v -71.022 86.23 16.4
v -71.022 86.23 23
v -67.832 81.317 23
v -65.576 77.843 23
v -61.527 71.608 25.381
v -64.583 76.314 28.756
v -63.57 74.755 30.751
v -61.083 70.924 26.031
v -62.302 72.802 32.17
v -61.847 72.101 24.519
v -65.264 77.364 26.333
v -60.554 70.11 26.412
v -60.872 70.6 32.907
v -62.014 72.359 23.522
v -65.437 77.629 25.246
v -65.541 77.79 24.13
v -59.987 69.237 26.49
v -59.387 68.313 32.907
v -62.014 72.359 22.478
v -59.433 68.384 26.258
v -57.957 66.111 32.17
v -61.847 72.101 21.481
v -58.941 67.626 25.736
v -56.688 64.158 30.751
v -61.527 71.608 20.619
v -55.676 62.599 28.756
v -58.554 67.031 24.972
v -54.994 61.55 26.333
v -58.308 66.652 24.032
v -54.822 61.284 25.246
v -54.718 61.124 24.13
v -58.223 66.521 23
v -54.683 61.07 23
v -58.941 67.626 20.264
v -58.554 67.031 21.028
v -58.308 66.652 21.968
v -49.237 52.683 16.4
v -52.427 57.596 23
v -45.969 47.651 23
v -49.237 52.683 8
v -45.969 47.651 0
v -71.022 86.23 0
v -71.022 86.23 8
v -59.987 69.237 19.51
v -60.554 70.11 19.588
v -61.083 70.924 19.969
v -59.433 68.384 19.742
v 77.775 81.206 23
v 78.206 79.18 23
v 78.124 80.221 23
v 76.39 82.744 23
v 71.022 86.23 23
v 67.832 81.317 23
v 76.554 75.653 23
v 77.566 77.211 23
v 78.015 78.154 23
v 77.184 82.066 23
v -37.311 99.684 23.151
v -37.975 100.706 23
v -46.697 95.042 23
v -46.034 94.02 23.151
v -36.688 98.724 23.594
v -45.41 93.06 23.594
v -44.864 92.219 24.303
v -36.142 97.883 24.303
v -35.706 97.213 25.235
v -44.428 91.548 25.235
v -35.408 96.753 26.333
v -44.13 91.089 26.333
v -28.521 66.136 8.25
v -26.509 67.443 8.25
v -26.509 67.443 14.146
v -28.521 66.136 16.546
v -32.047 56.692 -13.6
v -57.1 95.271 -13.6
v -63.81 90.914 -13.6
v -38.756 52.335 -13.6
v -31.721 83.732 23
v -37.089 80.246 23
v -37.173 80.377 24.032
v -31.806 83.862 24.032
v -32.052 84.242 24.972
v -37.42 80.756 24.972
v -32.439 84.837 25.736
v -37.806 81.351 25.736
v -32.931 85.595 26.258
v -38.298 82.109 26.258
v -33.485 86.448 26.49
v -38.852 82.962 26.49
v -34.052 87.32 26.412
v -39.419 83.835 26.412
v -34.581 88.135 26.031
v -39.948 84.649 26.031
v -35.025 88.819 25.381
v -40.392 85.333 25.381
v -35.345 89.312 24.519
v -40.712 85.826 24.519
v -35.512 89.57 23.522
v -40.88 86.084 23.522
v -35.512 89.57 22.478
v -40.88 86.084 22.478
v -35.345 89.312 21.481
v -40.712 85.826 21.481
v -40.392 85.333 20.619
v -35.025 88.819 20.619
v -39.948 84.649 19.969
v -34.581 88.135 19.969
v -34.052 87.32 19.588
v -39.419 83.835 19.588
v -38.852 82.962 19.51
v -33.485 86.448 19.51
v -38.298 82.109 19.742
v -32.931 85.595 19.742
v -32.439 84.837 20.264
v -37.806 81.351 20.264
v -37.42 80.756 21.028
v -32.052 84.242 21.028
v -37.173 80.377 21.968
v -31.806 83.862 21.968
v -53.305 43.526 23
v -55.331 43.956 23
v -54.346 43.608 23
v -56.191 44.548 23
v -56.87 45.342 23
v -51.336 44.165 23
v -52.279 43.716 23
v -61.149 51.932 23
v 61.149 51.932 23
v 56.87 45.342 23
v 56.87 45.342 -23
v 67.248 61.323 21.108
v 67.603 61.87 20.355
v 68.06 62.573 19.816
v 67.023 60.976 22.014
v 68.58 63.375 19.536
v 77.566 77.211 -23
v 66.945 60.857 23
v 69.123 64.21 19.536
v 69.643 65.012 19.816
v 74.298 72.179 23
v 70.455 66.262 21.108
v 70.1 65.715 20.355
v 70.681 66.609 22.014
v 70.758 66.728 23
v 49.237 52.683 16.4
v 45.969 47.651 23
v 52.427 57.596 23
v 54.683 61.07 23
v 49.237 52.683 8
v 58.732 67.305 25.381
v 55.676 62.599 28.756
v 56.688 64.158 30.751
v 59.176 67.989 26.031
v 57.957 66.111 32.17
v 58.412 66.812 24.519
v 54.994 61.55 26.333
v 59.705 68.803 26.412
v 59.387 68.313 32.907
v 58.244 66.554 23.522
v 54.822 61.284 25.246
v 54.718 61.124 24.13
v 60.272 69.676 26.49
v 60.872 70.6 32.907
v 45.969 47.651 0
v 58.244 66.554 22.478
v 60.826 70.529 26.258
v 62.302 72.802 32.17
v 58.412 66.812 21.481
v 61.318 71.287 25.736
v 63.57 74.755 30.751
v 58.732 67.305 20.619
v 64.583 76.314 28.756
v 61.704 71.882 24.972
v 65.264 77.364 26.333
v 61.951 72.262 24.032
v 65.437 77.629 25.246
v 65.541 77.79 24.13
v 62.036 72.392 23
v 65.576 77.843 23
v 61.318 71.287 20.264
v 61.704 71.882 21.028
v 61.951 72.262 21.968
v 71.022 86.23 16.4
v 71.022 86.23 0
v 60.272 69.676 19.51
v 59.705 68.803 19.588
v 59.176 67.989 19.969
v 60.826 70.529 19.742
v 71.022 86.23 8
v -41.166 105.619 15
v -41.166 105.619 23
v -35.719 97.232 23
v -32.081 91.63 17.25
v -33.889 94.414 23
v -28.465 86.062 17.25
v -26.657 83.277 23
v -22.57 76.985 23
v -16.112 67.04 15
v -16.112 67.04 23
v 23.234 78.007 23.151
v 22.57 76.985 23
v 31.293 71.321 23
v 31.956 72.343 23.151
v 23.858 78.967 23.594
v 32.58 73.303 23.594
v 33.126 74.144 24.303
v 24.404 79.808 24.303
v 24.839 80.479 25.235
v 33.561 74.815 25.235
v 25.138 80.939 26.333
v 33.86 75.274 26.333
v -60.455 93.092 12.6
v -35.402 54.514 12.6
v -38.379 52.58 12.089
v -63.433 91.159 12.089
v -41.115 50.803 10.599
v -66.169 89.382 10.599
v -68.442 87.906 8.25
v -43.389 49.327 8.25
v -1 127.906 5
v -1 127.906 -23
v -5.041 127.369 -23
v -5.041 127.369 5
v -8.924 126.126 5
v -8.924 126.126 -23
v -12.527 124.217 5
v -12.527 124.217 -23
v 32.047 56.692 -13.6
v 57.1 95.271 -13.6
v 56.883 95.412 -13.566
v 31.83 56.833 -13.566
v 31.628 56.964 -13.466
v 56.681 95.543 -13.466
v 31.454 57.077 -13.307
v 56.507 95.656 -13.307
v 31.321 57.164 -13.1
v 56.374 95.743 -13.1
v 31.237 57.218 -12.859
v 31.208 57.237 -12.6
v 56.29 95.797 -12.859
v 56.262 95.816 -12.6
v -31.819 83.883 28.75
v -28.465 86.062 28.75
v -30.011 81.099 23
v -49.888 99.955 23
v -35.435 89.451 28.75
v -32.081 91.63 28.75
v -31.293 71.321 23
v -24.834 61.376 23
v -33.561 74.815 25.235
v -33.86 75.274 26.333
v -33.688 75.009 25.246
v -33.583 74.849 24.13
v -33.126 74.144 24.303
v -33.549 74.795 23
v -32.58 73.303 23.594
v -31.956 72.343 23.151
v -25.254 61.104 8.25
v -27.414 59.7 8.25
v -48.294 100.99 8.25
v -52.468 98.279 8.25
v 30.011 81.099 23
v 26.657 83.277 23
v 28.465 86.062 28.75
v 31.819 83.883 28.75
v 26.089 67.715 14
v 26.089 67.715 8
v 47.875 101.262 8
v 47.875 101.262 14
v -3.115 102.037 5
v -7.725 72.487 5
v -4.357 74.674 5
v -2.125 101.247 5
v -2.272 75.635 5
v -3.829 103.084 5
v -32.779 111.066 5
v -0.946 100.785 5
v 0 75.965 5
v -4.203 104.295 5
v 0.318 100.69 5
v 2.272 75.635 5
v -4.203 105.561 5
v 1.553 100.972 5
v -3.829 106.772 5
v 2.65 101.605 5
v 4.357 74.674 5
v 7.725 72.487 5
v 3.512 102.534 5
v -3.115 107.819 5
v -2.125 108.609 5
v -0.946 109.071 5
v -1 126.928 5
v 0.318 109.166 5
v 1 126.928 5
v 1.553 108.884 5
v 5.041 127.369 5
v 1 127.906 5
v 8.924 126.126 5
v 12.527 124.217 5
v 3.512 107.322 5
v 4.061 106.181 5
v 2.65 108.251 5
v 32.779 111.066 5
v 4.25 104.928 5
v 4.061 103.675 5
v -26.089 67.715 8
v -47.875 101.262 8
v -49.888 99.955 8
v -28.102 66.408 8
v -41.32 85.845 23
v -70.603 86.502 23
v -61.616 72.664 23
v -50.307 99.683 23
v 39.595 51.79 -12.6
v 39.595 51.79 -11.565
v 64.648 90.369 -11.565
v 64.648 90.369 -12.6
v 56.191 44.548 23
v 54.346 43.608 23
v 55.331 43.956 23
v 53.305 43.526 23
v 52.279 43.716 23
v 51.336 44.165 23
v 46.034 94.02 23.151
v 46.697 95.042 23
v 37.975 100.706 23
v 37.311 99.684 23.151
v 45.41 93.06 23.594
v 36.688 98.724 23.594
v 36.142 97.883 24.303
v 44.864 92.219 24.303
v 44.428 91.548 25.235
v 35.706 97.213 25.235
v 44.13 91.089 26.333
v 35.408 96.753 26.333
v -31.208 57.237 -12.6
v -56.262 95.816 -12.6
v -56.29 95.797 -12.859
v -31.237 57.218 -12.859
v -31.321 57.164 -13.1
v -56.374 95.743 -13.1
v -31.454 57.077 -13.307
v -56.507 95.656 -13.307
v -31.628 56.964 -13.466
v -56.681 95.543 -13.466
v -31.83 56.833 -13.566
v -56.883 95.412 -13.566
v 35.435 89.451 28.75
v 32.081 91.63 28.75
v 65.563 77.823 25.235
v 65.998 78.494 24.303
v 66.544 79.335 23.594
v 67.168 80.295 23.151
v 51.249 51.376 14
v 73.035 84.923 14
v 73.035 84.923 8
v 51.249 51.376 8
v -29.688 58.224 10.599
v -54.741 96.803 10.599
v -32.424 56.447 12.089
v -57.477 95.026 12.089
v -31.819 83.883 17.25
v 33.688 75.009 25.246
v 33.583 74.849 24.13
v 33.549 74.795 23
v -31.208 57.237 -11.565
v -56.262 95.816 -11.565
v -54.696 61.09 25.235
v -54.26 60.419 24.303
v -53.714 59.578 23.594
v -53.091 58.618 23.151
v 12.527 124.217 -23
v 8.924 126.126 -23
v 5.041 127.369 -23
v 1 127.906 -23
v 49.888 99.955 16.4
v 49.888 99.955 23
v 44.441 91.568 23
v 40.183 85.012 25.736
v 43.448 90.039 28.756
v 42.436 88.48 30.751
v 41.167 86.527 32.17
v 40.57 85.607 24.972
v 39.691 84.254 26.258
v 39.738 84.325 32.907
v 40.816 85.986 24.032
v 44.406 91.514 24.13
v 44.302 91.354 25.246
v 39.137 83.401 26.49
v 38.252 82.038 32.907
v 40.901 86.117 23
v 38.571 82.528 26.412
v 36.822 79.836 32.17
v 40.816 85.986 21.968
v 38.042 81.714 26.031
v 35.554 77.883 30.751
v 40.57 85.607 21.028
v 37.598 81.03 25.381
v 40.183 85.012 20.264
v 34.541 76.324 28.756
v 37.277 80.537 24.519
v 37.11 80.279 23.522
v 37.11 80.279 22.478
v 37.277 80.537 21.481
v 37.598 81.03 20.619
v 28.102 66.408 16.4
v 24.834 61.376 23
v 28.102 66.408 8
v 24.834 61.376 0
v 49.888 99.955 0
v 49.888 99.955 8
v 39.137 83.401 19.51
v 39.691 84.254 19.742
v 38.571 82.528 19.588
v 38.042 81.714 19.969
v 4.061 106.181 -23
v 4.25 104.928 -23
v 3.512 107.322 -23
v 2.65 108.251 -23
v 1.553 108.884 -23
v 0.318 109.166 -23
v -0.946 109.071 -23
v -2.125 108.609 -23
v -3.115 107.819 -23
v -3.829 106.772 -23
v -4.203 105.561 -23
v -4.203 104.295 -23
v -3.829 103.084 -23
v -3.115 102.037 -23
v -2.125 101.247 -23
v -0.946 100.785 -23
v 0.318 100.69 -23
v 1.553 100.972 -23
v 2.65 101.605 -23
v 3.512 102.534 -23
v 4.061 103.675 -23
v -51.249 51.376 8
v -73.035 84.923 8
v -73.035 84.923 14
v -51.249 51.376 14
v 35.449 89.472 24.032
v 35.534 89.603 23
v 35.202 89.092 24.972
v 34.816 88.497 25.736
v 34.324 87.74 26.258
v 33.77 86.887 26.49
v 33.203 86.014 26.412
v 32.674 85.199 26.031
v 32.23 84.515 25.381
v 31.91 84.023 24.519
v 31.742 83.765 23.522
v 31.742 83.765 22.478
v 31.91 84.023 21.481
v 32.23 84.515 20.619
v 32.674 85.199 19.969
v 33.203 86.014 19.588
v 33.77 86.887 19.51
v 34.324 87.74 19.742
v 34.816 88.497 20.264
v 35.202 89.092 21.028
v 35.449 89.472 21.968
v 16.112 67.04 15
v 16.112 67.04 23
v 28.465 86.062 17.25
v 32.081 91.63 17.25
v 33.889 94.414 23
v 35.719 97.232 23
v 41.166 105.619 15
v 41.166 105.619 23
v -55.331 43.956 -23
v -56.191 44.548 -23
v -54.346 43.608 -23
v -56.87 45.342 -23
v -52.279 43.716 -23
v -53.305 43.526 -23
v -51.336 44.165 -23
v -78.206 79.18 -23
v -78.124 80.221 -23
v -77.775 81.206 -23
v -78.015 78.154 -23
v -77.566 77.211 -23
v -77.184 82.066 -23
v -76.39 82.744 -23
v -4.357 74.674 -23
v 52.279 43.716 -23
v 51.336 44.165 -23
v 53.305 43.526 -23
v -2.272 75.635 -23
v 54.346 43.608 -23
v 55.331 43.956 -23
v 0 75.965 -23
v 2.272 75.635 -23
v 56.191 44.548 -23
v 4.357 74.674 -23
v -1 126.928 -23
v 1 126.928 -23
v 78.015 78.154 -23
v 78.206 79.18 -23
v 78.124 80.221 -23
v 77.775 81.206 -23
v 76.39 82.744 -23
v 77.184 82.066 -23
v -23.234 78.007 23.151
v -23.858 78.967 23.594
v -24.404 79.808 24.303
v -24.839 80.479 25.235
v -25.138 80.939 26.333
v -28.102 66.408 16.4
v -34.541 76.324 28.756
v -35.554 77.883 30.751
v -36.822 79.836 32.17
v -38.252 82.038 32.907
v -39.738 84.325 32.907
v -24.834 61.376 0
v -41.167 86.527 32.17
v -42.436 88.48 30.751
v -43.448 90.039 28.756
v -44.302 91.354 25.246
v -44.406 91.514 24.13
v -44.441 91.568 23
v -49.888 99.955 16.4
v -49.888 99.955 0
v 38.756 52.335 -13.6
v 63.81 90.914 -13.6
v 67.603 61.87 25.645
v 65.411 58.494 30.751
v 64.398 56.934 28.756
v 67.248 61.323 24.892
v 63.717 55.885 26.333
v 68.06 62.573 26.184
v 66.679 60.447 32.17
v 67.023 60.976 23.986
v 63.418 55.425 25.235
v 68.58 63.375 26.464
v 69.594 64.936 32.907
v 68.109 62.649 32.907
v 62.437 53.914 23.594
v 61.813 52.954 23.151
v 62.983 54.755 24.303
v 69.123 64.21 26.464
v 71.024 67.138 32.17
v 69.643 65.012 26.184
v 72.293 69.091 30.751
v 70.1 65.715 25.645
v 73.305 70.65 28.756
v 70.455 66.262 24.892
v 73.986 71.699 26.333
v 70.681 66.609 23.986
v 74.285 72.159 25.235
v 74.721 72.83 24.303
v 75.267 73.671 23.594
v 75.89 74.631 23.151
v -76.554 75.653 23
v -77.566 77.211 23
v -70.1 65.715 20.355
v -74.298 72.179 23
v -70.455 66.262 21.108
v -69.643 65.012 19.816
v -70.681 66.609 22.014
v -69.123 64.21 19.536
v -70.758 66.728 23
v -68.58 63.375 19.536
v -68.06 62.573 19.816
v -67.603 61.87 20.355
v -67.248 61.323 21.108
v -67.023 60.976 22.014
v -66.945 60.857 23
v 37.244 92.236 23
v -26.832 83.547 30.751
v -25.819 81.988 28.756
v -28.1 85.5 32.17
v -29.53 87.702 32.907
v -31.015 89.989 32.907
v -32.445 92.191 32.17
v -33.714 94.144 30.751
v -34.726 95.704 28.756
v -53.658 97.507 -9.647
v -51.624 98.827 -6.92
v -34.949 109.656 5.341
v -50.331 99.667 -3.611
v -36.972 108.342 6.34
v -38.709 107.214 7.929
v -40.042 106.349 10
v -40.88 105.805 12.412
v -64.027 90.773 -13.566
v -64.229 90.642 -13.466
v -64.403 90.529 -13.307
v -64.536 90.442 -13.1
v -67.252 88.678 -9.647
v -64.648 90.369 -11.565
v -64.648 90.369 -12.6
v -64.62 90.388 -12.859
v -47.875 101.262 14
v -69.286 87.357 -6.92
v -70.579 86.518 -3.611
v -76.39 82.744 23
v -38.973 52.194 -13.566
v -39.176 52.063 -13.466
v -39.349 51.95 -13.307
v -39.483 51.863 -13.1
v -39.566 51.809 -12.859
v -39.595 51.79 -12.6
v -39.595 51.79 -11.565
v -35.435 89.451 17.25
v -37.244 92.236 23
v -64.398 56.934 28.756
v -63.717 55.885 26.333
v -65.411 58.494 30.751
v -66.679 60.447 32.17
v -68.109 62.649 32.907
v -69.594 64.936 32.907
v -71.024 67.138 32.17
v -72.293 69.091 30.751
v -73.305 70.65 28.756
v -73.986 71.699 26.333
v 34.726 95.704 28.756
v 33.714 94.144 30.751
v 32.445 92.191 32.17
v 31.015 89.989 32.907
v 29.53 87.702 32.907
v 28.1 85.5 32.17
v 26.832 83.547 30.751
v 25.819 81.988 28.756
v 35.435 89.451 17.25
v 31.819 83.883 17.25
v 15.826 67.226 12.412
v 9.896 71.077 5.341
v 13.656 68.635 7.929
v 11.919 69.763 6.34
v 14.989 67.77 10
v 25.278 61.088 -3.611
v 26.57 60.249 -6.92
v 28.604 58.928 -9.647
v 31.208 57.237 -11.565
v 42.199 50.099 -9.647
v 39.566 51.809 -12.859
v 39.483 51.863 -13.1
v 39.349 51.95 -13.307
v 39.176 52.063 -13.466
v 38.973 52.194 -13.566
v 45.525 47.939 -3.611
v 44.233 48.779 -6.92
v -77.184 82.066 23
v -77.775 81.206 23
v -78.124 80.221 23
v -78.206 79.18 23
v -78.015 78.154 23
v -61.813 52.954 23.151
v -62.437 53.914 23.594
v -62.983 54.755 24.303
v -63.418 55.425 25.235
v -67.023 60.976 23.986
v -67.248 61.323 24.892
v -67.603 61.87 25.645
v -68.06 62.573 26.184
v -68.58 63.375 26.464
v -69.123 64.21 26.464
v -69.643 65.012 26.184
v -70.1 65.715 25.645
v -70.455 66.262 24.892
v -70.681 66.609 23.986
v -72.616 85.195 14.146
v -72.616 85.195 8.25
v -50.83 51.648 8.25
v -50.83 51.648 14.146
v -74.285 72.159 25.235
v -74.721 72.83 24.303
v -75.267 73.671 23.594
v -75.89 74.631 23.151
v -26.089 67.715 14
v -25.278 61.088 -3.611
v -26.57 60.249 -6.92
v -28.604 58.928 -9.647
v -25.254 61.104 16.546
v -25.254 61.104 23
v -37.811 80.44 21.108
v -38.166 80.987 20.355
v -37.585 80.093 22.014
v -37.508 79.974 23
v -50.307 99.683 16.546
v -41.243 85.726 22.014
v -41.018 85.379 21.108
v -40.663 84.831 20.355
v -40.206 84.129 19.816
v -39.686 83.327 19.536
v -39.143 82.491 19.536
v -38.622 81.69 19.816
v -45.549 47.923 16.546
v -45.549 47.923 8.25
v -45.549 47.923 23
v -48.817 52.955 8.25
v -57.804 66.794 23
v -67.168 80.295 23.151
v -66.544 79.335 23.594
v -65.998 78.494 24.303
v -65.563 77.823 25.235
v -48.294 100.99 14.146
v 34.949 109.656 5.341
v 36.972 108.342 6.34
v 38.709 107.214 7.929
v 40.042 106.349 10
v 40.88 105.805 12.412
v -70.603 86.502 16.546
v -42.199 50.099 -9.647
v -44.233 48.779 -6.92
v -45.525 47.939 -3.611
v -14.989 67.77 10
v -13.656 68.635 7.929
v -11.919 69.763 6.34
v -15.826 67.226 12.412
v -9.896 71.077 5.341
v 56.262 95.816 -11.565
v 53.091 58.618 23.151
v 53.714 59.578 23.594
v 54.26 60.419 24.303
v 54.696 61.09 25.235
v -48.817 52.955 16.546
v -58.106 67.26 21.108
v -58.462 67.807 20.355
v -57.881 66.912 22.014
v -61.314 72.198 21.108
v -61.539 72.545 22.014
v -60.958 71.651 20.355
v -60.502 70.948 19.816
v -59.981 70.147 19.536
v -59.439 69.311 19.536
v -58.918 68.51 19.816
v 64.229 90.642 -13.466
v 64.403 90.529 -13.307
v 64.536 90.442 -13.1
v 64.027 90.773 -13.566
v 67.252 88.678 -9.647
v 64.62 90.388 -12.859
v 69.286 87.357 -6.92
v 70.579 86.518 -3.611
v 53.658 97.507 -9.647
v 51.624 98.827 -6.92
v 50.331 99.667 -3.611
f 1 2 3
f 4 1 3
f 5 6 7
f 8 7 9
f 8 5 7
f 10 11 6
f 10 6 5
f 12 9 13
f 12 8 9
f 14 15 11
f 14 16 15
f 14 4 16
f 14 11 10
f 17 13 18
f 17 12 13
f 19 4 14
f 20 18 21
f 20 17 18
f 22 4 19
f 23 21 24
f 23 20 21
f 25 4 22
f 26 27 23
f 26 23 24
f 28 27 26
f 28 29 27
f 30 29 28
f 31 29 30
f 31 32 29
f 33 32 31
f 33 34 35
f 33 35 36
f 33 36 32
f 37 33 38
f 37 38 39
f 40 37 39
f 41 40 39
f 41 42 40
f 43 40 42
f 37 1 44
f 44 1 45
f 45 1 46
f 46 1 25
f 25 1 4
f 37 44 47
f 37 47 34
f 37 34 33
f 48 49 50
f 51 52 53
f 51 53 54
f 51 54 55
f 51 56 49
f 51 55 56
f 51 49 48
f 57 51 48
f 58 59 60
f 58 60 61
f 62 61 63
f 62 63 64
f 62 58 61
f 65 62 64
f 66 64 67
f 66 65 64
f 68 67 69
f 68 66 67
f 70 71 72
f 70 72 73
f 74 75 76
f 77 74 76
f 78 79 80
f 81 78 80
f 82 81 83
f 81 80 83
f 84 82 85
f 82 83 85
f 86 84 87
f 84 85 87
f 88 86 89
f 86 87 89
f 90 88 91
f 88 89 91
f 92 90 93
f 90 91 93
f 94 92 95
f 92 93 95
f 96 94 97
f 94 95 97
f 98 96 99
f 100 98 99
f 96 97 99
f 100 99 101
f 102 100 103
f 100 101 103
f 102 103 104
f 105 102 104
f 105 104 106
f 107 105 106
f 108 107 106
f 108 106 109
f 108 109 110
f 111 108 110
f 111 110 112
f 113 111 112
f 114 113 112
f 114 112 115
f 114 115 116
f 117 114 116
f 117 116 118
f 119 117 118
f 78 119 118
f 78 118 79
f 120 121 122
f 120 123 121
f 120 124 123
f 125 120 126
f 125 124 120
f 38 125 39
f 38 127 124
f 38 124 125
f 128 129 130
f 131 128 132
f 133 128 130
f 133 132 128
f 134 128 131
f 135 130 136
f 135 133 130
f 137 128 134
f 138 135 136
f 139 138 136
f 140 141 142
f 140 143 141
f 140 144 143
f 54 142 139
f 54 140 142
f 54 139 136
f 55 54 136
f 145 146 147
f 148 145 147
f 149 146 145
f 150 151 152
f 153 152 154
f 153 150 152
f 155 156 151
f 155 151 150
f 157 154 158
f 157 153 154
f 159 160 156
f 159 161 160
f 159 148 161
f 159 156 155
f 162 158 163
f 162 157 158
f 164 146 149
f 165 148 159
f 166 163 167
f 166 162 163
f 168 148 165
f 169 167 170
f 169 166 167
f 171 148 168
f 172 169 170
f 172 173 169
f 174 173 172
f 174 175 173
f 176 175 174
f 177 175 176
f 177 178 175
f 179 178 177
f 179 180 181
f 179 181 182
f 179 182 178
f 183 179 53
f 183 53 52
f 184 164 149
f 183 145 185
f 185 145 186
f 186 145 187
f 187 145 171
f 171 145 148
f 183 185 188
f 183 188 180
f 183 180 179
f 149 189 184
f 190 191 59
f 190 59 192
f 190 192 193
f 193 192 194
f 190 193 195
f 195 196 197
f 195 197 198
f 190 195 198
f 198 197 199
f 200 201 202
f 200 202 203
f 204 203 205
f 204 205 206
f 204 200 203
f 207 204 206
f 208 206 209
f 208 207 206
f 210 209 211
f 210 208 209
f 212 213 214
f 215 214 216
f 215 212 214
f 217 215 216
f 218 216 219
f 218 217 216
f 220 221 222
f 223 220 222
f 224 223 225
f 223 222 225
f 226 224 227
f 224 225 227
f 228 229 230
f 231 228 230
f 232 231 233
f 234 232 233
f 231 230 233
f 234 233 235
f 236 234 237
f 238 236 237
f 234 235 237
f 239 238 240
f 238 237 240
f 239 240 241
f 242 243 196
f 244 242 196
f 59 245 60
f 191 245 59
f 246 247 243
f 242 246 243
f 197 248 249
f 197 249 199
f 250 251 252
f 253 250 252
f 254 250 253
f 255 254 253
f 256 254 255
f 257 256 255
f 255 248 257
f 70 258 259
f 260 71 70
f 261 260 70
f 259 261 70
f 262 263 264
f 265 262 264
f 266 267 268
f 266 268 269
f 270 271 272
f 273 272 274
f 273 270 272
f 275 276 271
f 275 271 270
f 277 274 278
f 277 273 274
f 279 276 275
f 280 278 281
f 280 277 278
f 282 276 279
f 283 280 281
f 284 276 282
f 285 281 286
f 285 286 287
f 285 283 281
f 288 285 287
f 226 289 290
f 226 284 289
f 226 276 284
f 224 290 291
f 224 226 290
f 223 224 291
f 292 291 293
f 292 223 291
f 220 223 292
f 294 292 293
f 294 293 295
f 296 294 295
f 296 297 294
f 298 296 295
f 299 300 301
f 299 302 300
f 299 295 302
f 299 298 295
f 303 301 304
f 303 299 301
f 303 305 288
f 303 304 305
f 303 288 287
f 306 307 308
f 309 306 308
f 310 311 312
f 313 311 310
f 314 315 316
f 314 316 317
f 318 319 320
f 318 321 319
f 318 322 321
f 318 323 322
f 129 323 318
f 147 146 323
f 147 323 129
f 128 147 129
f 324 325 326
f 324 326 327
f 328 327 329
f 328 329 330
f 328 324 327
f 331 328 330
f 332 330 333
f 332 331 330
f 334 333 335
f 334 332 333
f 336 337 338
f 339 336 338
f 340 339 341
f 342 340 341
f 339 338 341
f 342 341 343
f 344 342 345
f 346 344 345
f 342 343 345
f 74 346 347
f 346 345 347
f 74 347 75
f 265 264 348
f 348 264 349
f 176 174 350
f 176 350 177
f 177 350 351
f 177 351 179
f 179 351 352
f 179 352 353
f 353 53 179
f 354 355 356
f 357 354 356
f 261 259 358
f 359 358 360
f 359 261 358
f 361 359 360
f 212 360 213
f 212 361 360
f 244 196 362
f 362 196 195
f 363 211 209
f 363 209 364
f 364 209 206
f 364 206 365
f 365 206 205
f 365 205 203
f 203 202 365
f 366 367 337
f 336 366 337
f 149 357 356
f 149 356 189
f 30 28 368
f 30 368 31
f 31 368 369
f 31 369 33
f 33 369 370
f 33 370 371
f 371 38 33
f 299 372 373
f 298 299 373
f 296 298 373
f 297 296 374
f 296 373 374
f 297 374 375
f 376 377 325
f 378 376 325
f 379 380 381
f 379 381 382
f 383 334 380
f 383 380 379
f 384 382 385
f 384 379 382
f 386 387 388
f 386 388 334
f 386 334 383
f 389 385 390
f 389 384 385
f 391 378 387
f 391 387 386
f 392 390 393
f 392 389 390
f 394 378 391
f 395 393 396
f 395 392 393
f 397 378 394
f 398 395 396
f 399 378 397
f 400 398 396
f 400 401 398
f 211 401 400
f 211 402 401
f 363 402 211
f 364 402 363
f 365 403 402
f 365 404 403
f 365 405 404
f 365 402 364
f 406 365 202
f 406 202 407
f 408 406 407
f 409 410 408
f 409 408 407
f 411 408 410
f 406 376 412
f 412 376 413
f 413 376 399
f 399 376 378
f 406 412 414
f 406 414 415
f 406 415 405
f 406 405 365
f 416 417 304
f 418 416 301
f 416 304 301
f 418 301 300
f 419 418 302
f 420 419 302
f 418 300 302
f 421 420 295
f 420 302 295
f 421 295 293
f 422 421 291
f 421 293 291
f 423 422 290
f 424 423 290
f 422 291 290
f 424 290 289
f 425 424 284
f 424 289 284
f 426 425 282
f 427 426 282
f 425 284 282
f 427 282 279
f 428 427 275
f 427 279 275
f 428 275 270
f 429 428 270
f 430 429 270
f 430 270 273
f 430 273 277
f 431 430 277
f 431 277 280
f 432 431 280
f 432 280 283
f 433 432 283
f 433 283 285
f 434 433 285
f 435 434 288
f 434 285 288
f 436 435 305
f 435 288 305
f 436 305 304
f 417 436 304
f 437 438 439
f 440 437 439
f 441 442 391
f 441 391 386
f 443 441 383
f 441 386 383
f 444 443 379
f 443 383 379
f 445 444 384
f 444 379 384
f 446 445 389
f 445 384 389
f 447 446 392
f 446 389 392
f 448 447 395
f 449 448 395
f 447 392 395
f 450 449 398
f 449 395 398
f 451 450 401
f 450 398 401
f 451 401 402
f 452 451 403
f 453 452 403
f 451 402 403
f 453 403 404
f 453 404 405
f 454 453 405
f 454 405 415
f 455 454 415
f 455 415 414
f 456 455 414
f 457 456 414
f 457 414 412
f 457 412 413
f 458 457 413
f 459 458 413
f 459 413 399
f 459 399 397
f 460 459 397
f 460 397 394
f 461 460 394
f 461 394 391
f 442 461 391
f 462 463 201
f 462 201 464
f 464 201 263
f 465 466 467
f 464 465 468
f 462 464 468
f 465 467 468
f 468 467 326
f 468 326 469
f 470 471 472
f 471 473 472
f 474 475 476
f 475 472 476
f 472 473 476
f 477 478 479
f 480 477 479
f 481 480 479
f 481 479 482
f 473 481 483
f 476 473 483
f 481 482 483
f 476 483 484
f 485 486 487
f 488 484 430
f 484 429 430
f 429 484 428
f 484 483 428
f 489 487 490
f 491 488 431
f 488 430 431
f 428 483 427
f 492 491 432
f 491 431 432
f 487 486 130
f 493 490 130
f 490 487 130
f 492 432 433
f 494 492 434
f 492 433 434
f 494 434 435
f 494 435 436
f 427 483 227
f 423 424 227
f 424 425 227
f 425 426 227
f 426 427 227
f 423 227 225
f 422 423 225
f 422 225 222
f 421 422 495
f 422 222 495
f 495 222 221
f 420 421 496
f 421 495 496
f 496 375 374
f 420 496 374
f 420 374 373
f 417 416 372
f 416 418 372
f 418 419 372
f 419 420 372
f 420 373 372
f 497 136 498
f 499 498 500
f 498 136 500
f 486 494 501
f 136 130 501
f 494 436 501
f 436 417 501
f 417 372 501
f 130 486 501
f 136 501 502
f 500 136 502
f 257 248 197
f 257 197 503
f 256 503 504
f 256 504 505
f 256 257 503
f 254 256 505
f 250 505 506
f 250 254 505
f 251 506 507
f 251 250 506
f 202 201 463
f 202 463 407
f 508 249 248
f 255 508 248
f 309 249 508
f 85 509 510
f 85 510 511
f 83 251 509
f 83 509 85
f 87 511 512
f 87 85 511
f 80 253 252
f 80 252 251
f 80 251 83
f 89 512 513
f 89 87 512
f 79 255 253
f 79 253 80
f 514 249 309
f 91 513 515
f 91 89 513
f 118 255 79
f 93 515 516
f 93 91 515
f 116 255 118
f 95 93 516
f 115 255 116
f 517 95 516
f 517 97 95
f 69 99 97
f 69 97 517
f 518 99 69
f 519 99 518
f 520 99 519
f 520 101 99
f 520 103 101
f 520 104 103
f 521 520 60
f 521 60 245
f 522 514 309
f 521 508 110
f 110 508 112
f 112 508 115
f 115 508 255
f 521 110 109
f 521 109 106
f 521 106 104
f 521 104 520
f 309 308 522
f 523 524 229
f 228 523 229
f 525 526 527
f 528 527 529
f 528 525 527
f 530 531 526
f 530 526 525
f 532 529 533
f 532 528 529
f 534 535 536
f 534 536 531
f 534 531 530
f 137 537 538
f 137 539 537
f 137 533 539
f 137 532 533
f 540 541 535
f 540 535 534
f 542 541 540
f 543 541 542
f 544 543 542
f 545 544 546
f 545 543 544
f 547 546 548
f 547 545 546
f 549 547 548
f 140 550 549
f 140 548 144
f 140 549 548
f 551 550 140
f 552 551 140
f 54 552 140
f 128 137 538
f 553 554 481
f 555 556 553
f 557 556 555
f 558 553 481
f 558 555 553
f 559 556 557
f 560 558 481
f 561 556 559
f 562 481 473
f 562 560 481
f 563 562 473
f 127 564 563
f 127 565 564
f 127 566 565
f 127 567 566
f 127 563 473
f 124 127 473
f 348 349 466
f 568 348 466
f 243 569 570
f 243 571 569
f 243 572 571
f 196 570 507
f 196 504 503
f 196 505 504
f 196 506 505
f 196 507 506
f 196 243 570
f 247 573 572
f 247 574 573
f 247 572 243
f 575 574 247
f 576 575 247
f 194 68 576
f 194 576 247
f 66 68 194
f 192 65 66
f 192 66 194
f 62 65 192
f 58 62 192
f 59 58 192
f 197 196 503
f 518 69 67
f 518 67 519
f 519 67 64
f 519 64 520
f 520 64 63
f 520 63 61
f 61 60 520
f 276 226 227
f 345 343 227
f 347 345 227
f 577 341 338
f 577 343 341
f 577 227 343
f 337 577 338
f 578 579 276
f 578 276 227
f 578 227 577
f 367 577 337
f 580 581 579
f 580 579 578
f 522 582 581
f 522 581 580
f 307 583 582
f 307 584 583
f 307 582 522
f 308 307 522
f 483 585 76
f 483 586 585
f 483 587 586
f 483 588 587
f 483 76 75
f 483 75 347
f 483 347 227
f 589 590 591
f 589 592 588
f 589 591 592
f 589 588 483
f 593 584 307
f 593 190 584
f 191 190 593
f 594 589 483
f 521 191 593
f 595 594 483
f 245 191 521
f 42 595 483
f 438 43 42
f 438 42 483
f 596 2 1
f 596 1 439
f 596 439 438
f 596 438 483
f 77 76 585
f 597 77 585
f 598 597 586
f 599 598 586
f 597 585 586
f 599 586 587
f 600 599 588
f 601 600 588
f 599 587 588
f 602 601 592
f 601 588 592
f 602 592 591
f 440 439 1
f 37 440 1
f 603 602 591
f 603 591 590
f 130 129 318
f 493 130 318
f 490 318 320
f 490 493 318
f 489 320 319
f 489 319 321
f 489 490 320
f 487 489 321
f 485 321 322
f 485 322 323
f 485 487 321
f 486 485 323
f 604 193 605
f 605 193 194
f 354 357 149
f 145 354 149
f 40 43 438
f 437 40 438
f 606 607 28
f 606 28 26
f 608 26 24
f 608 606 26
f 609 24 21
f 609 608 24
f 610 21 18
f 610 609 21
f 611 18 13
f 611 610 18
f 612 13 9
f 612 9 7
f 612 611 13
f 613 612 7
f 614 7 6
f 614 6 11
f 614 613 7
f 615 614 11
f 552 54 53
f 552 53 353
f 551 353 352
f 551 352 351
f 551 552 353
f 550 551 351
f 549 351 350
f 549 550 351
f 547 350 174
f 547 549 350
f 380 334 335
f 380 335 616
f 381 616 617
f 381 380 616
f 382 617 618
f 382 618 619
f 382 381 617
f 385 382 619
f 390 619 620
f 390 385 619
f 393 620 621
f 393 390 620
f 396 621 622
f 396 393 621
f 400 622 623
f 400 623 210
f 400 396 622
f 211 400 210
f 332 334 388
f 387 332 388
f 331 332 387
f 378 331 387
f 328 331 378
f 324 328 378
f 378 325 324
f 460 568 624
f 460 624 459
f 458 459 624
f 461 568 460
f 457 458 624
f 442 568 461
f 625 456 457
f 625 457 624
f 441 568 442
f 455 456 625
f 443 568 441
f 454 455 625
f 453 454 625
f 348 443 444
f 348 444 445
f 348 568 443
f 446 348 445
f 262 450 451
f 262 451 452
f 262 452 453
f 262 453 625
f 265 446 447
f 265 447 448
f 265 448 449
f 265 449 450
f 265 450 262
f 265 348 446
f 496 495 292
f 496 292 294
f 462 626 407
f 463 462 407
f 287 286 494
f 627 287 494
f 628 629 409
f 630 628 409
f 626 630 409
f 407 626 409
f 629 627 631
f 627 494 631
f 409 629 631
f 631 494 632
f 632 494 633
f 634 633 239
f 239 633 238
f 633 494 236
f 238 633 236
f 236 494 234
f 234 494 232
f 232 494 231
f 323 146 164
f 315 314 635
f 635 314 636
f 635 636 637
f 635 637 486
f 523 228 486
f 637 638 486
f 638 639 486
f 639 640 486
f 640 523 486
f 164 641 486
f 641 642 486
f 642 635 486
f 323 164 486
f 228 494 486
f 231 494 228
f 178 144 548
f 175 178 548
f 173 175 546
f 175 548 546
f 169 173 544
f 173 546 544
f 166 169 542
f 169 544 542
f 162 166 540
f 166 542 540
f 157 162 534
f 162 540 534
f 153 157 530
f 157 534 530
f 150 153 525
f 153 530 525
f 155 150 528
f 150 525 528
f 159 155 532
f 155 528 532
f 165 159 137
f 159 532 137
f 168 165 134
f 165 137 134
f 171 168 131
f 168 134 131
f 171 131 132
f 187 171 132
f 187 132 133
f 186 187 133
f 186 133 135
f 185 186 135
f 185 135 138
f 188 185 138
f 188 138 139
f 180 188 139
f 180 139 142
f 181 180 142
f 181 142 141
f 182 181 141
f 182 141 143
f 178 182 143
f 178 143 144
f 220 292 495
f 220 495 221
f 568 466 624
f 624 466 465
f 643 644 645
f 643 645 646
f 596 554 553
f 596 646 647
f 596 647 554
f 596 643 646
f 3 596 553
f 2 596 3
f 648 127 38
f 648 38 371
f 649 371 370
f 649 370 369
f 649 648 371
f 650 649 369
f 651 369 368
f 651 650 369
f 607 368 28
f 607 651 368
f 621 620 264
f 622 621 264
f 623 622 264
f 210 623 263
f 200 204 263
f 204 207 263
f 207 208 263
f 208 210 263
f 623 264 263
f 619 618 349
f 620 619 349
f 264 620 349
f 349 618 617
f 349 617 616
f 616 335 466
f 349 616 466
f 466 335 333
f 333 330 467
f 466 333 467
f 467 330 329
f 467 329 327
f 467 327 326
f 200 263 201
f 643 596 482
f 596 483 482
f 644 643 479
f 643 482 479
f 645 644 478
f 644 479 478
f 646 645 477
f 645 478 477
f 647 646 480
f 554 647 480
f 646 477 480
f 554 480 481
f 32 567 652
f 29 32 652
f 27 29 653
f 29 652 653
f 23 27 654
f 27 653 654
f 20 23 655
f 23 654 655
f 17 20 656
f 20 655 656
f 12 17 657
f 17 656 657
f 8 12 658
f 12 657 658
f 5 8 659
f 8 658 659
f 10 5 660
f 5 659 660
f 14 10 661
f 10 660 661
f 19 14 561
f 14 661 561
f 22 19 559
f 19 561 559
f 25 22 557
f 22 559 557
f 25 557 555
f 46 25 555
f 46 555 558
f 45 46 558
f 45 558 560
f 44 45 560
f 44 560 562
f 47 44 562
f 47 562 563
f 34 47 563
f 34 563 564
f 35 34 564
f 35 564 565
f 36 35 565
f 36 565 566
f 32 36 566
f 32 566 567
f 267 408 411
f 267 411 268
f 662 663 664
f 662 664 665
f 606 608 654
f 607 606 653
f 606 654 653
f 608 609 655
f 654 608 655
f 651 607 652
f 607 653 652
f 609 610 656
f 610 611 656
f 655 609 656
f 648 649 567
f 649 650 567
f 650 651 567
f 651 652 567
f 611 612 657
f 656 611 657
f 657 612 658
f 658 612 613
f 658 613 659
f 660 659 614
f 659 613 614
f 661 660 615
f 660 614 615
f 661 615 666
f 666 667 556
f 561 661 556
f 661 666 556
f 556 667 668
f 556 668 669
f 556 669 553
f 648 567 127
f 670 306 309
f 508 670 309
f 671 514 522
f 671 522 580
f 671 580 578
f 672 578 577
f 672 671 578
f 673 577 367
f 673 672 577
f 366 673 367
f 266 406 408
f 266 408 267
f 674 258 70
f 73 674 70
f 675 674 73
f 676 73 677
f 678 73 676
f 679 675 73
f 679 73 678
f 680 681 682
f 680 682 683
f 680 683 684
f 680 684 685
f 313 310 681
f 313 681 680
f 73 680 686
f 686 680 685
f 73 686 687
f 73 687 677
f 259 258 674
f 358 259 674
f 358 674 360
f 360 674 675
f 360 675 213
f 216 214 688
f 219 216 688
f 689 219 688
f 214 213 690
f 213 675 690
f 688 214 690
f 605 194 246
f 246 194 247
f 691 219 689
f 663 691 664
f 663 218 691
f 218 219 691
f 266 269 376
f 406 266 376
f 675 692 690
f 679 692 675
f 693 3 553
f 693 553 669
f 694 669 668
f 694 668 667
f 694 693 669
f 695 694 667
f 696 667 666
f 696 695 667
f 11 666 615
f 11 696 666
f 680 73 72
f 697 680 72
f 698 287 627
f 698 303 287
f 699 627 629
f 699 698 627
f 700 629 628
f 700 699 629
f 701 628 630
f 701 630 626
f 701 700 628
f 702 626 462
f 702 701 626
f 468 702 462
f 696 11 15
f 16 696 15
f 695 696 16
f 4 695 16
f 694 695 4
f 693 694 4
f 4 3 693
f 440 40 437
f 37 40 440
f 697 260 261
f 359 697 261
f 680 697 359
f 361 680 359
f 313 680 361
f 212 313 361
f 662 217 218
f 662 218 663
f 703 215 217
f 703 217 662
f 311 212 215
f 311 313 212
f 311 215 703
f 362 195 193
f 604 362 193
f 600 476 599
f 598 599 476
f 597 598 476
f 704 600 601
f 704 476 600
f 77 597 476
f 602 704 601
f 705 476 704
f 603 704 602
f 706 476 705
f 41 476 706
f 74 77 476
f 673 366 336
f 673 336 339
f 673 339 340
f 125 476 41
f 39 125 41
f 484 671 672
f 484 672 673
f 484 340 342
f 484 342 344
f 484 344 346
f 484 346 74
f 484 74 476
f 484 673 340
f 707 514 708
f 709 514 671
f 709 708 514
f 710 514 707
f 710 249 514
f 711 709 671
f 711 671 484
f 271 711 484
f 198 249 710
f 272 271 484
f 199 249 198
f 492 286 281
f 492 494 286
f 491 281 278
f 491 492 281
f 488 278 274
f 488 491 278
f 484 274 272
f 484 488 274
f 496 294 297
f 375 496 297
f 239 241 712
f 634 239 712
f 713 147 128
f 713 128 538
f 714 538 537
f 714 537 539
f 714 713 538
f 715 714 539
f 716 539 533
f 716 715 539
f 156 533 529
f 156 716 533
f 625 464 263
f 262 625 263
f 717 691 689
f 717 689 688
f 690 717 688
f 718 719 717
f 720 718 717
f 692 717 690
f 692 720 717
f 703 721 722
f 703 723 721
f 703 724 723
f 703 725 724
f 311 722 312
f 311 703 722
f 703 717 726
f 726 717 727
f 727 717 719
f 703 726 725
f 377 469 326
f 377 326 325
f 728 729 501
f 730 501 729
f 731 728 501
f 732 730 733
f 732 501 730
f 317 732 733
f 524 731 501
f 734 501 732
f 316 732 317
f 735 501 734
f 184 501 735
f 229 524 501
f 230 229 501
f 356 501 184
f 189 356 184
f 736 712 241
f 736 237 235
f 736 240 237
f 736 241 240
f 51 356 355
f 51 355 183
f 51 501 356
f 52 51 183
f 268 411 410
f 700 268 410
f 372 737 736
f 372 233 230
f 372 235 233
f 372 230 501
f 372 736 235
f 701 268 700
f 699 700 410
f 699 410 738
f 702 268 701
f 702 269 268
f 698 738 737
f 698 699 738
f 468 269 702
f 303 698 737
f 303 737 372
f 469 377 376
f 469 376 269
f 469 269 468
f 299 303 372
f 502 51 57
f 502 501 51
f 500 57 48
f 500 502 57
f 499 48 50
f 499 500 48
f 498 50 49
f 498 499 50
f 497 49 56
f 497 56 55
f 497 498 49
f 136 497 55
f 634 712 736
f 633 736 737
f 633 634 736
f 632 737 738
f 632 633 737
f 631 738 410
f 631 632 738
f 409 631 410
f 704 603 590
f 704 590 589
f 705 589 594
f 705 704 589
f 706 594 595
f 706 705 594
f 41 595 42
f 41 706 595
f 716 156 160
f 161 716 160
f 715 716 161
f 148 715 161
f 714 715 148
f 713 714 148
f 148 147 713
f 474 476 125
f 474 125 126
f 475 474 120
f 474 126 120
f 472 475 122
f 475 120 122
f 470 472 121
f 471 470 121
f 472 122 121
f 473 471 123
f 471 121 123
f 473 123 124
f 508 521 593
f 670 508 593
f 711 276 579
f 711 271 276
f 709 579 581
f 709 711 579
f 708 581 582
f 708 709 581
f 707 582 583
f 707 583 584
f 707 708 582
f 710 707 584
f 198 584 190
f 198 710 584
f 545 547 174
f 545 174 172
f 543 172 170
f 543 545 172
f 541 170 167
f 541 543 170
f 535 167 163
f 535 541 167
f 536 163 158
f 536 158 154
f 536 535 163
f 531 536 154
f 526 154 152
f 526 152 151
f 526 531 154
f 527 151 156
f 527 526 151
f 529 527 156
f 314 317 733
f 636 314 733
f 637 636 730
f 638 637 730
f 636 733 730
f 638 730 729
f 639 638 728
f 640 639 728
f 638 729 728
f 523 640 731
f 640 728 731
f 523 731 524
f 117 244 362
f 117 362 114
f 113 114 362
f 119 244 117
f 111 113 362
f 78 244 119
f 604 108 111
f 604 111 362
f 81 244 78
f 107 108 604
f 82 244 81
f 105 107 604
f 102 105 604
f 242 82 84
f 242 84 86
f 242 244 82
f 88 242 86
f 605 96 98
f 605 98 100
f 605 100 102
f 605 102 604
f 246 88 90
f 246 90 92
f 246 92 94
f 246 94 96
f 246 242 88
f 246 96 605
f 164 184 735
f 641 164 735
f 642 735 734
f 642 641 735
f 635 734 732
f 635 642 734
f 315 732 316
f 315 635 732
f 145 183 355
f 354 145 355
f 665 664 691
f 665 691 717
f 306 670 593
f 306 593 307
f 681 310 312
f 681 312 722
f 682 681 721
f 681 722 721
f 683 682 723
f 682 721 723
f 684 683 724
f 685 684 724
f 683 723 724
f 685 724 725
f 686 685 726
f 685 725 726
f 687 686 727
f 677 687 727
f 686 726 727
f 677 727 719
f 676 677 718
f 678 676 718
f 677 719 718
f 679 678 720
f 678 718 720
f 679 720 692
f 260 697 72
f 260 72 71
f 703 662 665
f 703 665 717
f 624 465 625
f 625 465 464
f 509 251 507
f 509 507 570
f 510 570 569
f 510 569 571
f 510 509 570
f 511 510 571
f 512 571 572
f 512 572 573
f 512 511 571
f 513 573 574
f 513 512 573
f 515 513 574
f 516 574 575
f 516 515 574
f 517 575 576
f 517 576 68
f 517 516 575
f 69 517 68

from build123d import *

# Parameters (mm, degrees)
F1_DEPTH      = 23
F7_DEPTH      = 18
F8_R          = 10
F10_DEPTH     = 46
F9_R          = 10
F11_DEPTH     = 46
F14_DEPTH     = 33.001
F15_DEPTH     = 33.001
F16_R         = 8
F17_R         = 10
F20_DEPTH     = 40
F21_DEPTH     = 40
F24_DEPTH     = 46
F25_DEPTH     = 46
F26_T1_DEPTH  = 10.4
F26_T3_DEPTH  = 10.4
F26_T5_DEPTH  = 10.4
F26_T7_DEPTH  = 10.4
F26_T9_DEPTH  = 10.4
F26_T11_DEPTH = 10.4
F26_T13_DEPTH = 10.4
F26_T15_DEPTH = 10.4
F27_R         = 4.25
F27_W         = 2
F27_H         = 2
F28_DEPTH     = 28
F30_DEPTH     = 46
F31_R         = 3.5
F32_DEPTH     = 46
F33_R         = 3.5
F34_DEPTH     = 46
F36_DEPTH     = 4
F38_DEPTH     = 4
F39_R         = 4
F40_W         = 6
F40_H         = 8.2964466094
F41_DEPTH     = 2.4
F42_W         = 6.0000000001
F42_H         = 8.2964466094
F43_DEPTH     = 2.4


# Not quite as in the source:
# - a fillet or chamfer that OpenCascade refuses, or shapes differently, is made with other operations: its cross-section is extruded or revolved along the edge and cut away or added


with BuildPart() as f1:
    # F0 (on Top) → F1 (new body, symmetric)
    with BuildSketch(Plane.XY):
        with BuildLine():
            Line((-79.7443559494, 80.5657352366), (-54.6909603387, 41.9868891111))
            Line((-54.6909603387, 41.9868891111), (0, 77.5036140343))
            Line((0, 77.5036140343), (54.6909603387, 41.9868891111))
            Line((54.6909603387, 41.9868891111), (79.7443559494, 80.5657352366))
            Line((79.7443559494, 80.5657352366), (12.5266978053, 124.2173928323))
            ThreePointArc((12.5266978053, 124.2173928323), (6.5323529282, 126.9808236715), (0, 127.9279697696))
            ThreePointArc((0, 127.9279697696), (-6.5323529282, 126.9808236715), (-12.5266978053, 124.2173928323))
            Line((-12.5266978053, 124.2173928323), (-79.7443559494, 80.5657352366))
        make_face()
    extrude(amount=F1_DEPTH, both=True)

    # F2 (on Top) → F4 (revolve, cut)
    with BuildSketch(Plane.XY):
        Polygon((-71.0221820428, 86.2299812008), (-45.9687864321, 47.6511350753), (-35.401537276, 54.5135869165), (-60.4549328867, 93.0924330419), align=None)
    revolve(axis=Axis((-28.5739341007, 44, 0), (-0.544639035, 0.8386705679, 0)), mode=Mode.SUBTRACT)

    # F3 (on Top) → F5 (revolve, cut)
    with BuildSketch(Plane.XY):
        Polygon((49.8876837306, 99.9548848831), (24.8342881199, 61.3760387576), (35.401537276, 54.5135869165), (60.4549328867, 93.0924330419), align=None)
    revolve(axis=Axis((28.5739341007, 44, 0), (0.544639035, 0.8386705679, 0)), mode=Mode.SUBTRACT)

    # F6 (on face) → F7 (cut)
    with BuildSketch(Plane.XY.offset(23)):
        with BuildLine():
            Line((-12.5266978053, 124.2173928323), (-41.1655098239, 105.6191308473))
            Line((-41.1655098239, 105.6191308473), (-16.1121142132, 67.0402847218))
            Line((-16.1121142132, 67.0402847218), (0, 77.5036140343))
            Line((0, 77.5036140343), (16.1121142132, 67.0402847218))
            Line((16.1121142132, 67.0402847218), (41.1655098239, 105.6191308473))
            Line((41.1655098239, 105.6191308473), (12.5266978053, 124.2173928323))
            ThreePointArc((12.5266978053, 124.2173928323), (6.5323529282, 126.9808236715), (0, 127.9279697696))
            ThreePointArc((0, 127.9279697696), (-6.5323529282, 126.9808236715), (-12.5266978053, 124.2173928323))
        make_face()
    extrude(amount=-F7_DEPTH, mode=Mode.SUBTRACT)

    # F8 (on face) → F10 (join, through all)
    with BuildSketch(Plane(origin=(-19.2894230627, -12.5266978053, 0), x_dir=(0.544639035, -0.8386705679, 0), z_dir=(-0.8386705679, -0.544639035, 0))):
        with Locations((-91, 23)):
            Circle(F8_R)
    extrude(amount=-F10_DEPTH)

    # F9 (on face) → F11 (join, through all)
    with BuildSketch(Plane(origin=(19.2894230627, -12.5266978053, 0), x_dir=(0.544639035, 0.8386705679, 0), z_dir=(0.8386705679, -0.544639035, 0))):
        with Locations((91, 23)):
            Circle(F9_R)
    extrude(amount=-F11_DEPTH)

    # F12 (on Top) → F14 (cut, through all)
    with BuildSketch(Plane.XY):
        Polygon((-71.0221820428, 86.2299812008), (-45.9687864321, 47.6511350753), (-35.401537276, 54.5135869165), (-24.8342881199, 61.3760387576), (-49.8876837306, 99.9548848831), (-60.4549328867, 93.0924330419), align=None)
    extrude(amount=F14_DEPTH, mode=Mode.SUBTRACT)

    # F13 (on Top) → F15 (cut, through all)
    with BuildSketch(Plane.XY):
        Polygon((24.8342881199, 61.3760387576), (35.401537276, 54.5135869165), (45.9687864321, 47.6511350753), (71.0221820428, 86.2299812008), (60.4549328867, 93.0924330419), (49.8876837306, 99.9548848831), align=None)
    extrude(amount=F15_DEPTH, mode=Mode.SUBTRACT)

    # F16
    f16_edges = [f1.edges().sort_by_distance(p)[0] for p in [
        (0, 77.503614, 2.5),
        (0, 77.503614, -11.5),
    ]]
    fillet(f16_edges, radius=F16_R)

    # F17
    f17_edges = [f1.edges().sort_by_distance(p)[0] for p in [
        (28.638812, 86.329708, 5),
        (-28.638812, 86.329708, 5),
    ]]
    fillet(f17_edges, radius=F17_R)

    # F18 (on face) → F20 (cut)
    with BuildSketch(Plane(origin=(-60.4549328867, 93.0924330419, 0), x_dir=(-0.8386705679, -0.544639035, 0), z_dir=(-0.544639035, 0.8386705679, 0))):
        Polygon((12.6, 16.4), (-12.6, 16.4), (-15, 14), (-15, 8), (15, 8), (15, 14), align=None)
    extrude(amount=-F20_DEPTH, mode=Mode.SUBTRACT)

    # F19 (on face) → F21 (cut)
    with BuildSketch(Plane(origin=(60.4549328867, 93.0924330419, 0), x_dir=(-0.8386705679, 0.544639035, 0), z_dir=(0.544639035, 0.8386705679, 0))):
        Polygon((-15, 14), (-15, 8), (15, 8), (15, 14), (12.6, 16.4), (-12.6, 16.4), align=None)
    extrude(amount=-F21_DEPTH, mode=Mode.SUBTRACT)

    # F22 (on face) → F24 (cut, through all)
    with BuildSketch(Plane(origin=(-60.4549328867, 93.0924330419, 0), x_dir=(-0.8386705679, -0.544639035, 0), z_dir=(-0.544639035, 0.8386705679, 0))):
        with BuildLine():
            Line((5, -10.6), (-5, -10.6))
            Line((-5, -10.6), (-5, -12.6))
            ThreePointArc((-5, -12.6), (-4.7071067812, -13.3071067812), (-4, -13.6))
            Line((-4, -13.6), (4, -13.6))
            ThreePointArc((4, -13.6), (4.7071067812, -13.3071067812), (5, -12.6))
            Line((5, -12.6), (5, -10.6))
        make_face()
    extrude(amount=-F24_DEPTH, mode=Mode.SUBTRACT)

    # F23 (on face) → F25 (cut, through all)
    with BuildSketch(Plane(origin=(60.4549328867, 93.0924330419, 0), x_dir=(-0.8386705679, 0.544639035, 0), z_dir=(0.544639035, 0.8386705679, 0))):
        with BuildLine():
            ThreePointArc((-5, -12.6), (-4.7071067812, -13.3071067812), (-4, -13.6))
            Line((-4, -13.6), (4, -13.6))
            ThreePointArc((4, -13.6), (4.7071067812, -13.3071067812), (5, -12.6))
            Line((5, -12.6), (5, -10.6))
            Line((5, -10.6), (-5, -10.6))
            Line((-5, -10.6), (-5, -12.6))
        make_face()
    extrude(amount=-F25_DEPTH, mode=Mode.SUBTRACT)

    # F26: fillet of radius 5 on 8 edges, made by hand

    # F26_s2 → F26_t1 (join)
    with BuildSketch(Plane(origin=(10.5672491561, 6.8624518412, 0), x_dir=(0, 0, 1), z_dir=(0.8386705679, 0.544639035, 0))):
        with BuildLine():
            ThreePointArc((23, -76.8578643763), (23.9175170954, -79.7446157222), (26.3333333333, -81.5719095842))
            ThreePointArc((26.3333333333, -81.5719095842), (24.6910197873, -81.1440144035), (23, -81))
            Line((23, -81), (23, -76.8578643763))
        make_face()
    extrude(amount=F26_T1_DEPTH)

    # F26_s4 → F26_t3 (join)
    with BuildSketch(Plane(origin=(-19.2894230627, -12.5266978053, 0), x_dir=(0, 0, 1), z_dir=(0.8386705679, 0.544639035, 0))):
        with BuildLine():
            ThreePointArc((23, -76.8578643763), (23.9175170954, -79.7446157222), (26.3333333333, -81.5719095842))
            ThreePointArc((26.3333333333, -81.5719095842), (24.6910197873, -81.1440144035), (23, -81))
            Line((23, -81), (23, -76.8578643763))
        make_face()
    extrude(amount=F26_T3_DEPTH)

    # F26_s6 → F26_t5 (join)
    with BuildSketch(Plane(origin=(10.5672491561, -6.8624518412, 0), x_dir=(0, 0, 1), z_dir=(0.8386705679, -0.544639035, 0))):
        with BuildLine():
            ThreePointArc((23, -76.8578643763), (23.9175170954, -79.7446157222), (26.3333333333, -81.5719095842))
            ThreePointArc((26.3333333333, -81.5719095842), (24.6910197873, -81.1440144035), (23, -81))
            Line((23, -81), (23, -76.8578643763))
        make_face()
    extrude(amount=F26_T5_DEPTH)

    # F26_s8 → F26_t7 (join)
    with BuildSketch(Plane(origin=(-19.2894230627, 12.5266978053, 0), x_dir=(0, 0, 1), z_dir=(0.8386705679, -0.544639035, 0))):
        with BuildLine():
            ThreePointArc((23, -76.8578643763), (23.9175170954, -79.7446157222), (26.3333333333, -81.5719095842))
            ThreePointArc((26.3333333333, -81.5719095842), (24.6910197873, -81.1440144035), (23, -81))
            Line((23, -81), (23, -76.8578643763))
        make_face()
    extrude(amount=F26_T7_DEPTH)

    # F26_s10 → F26_t9 (join)
    with BuildSketch(Plane(origin=(19.2894230627, 12.5266978053, 0), x_dir=(0, 0, 1), z_dir=(-0.8386705679, -0.544639035, 0))):
        with BuildLine():
            ThreePointArc((23, 105.1421356237), (23.9175170954, 102.2553842778), (26.3333333333, 100.4280904158))
            ThreePointArc((26.3333333333, 100.4280904158), (24.6910197873, 100.8559855965), (23, 101))
            Line((23, 101), (23, 105.1421356237))
        make_face()
    extrude(amount=F26_T9_DEPTH)

    # F26_s12 → F26_t11 (join)
    with BuildSketch(Plane(origin=(-10.5672491561, -6.8624518412, 0), x_dir=(0, 0, 1), z_dir=(-0.8386705679, -0.544639035, 0))):
        with BuildLine():
            ThreePointArc((23, 105.1421356237), (23.9175170954, 102.2553842778), (26.3333333333, 100.4280904158))
            ThreePointArc((26.3333333333, 100.4280904158), (24.6910197873, 100.8559855965), (23, 101))
            Line((23, 101), (23, 105.1421356237))
        make_face()
    extrude(amount=F26_T11_DEPTH)

    # F26_s14 → F26_t13 (join)
    with BuildSketch(Plane(origin=(-10.5672491561, 6.8624518412, 0), x_dir=(0, 0, 1), z_dir=(-0.8386705679, 0.544639035, 0))):
        with BuildLine():
            ThreePointArc((23, 105.1421356237), (23.9175170954, 102.2553842778), (26.3333333333, 100.4280904158))
            ThreePointArc((26.3333333333, 100.4280904158), (24.6910197873, 100.8559855965), (23, 101))
            Line((23, 101), (23, 105.1421356237))
        make_face()
    extrude(amount=F26_T13_DEPTH)

    # F26_s16 → F26_t15 (join)
    with BuildSketch(Plane(origin=(19.2894230627, -12.5266978053, 0), x_dir=(0, 0, 1), z_dir=(-0.8386705679, 0.544639035, 0))):
        with BuildLine():
            ThreePointArc((23, 105.1421356237), (23.9175170954, 102.2553842778), (26.3333333333, 100.4280904158))
            ThreePointArc((26.3333333333, 100.4280904158), (24.6910197873, 100.8559855965), (23, 101))
            Line((23, 101), (23, 105.1421356237))
        make_face()
    extrude(amount=F26_T15_DEPTH)

    # F27 (on face) → F28 (cut, through all)
    with BuildSketch(Plane.XY.offset(5)):
        with Locations((0, 104.9279697696)):
            Circle(F27_R)
        with Locations((0, 127.9279697696)):
            Rectangle(F27_W, F27_H)
    extrude(amount=-F28_DEPTH, mode=Mode.SUBTRACT)


with BuildPart() as f30:
    # F29 (on face) → F30 (new body, through all)
    with BuildSketch(Plane(origin=(-60.4549328867, 93.0924330419, 0), x_dir=(-0.8386705679, -0.544639035, 0), z_dir=(-0.544639035, 0.8386705679, 0))):
        with BuildLine():
            ThreePointArc((-9.5235235076, 8.25), (-5.23497851, 11.4610208969), (0, 12.6))
            ThreePointArc((0, 12.6), (5.23497851, 11.4610208969), (9.5235235076, 8.25))
            Line((9.5235235076, 8.25), (14.5, 8.25))
            Line((14.5, 8.25), (14.5, 14.1464466094))
            Line((14.5, 14.1464466094), (12.1, 16.5464466094))
            Line((12.1, 16.5464466094), (12.1, 23))
            Line((12.1, 23), (0, 23))
            Line((0, 23), (-12.1, 23))
            Line((-12.1, 23), (-12.1, 16.5464466094))
            Line((-12.1, 16.5464466094), (-14.5, 14.1464466094))
            Line((-14.5, 14.1464466094), (-14.5, 8.25))
            Line((-14.5, 8.25), (-9.5235235076, 8.25))
        make_face()
    extrude(amount=-F30_DEPTH)


with BuildPart() as f32_tool:
    # F31 (on face) → F32 (new body, through all)
    with BuildSketch(Plane(origin=(-19.2894230627, -12.5266978053, 0), x_dir=(0.544639035, -0.8386705679, 0), z_dir=(-0.8386705679, -0.544639035, 0))):
        with Locations((-91, 23)):
            Circle(F31_R)
    extrude(amount=-F32_DEPTH)


with BuildPart() as f1_1:
    add(f1.part)

    # F32: cut by f32_tool
    add(f32_tool.part, mode=Mode.SUBTRACT)

    # F33 (on face) → F34 (cut, through all)
    with BuildSketch(Plane(origin=(19.2894230627, -12.5266978053, 0), x_dir=(0.544639035, 0.8386705679, 0), z_dir=(0.8386705679, -0.544639035, 0))):
        with Locations((91, 23)):
            Circle(F33_R)
    extrude(amount=-F34_DEPTH, mode=Mode.SUBTRACT)

    # F35 (on face) → F36 (cut)
    with BuildSketch(Plane(origin=(19.2894230627, 12.5266978053, 0), x_dir=(-0.544639035, 0.8386705679, 0), z_dir=(0.8386705679, 0.544639035, 0))):
        Polygon((87.6802359521, 28.75), (84.3604719042, 23), (87.6802359521, 17.25), (94.3197640477, 17.25), (97.6395280956, 23), (94.3197640477, 28.75), align=None)
    extrude(amount=-F36_DEPTH, mode=Mode.SUBTRACT)

    # F37 (on face) → F38 (cut)
    with BuildSketch(Plane(origin=(-19.2894230627, 12.5266978053, 0), x_dir=(-0.544639035, -0.8386705679, 0), z_dir=(-0.8386705679, 0.544639035, 0))):
        Polygon((-94.319764048, 28.75), (-97.6395280959, 23), (-94.319764048, 17.25), (-87.6802359523, 17.25), (-84.3604719045, 23), (-87.6802359523, 28.75), align=None)
    extrude(amount=-F38_DEPTH, mode=Mode.SUBTRACT)

    # F39
    f39_edges = [f1_1.edges().sort_by_distance(p)[0] for p in [
        (79.744356, 80.565735, 0),
        (54.69096, 41.986889, 0),
        (-54.69096, 41.986889, 0),
        (-79.744356, 80.565735, 0),
    ]]
    fillet(f39_edges, radius=F39_R)


with BuildPart() as f30_1:
    add(f30.part)

    # F32: cut by f32_tool
    add(f32_tool.part, mode=Mode.SUBTRACT)

    # F40 (on face) → F41 (cut, through all)
    with BuildSketch(Plane(origin=(-12.1607232352, -7.8972660077, 0), x_dir=(0.544639035, -0.8386705679, 0), z_dir=(-0.8386705679, -0.544639035, 0))):
        with Locations((-67.9999999999, 12.3982233047)):
            Rectangle(F40_W, F40_H)
    extrude(amount=-F41_DEPTH, mode=Mode.SUBTRACT)

    # F42 (on face) → F43 (cut, through all)
    with BuildSketch(Plane(origin=(12.1607232352, 7.8972660077, 0), x_dir=(-0.544639035, 0.8386705679, 0), z_dir=(0.8386705679, 0.544639035, 0))):
        with Locations((67.9999999999, 12.3982233047)):
            Rectangle(F42_W, F42_H)
    extrude(amount=-F43_DEPTH, mode=Mode.SUBTRACT)


solid = Compound([f1_1.part, f30_1.part])
